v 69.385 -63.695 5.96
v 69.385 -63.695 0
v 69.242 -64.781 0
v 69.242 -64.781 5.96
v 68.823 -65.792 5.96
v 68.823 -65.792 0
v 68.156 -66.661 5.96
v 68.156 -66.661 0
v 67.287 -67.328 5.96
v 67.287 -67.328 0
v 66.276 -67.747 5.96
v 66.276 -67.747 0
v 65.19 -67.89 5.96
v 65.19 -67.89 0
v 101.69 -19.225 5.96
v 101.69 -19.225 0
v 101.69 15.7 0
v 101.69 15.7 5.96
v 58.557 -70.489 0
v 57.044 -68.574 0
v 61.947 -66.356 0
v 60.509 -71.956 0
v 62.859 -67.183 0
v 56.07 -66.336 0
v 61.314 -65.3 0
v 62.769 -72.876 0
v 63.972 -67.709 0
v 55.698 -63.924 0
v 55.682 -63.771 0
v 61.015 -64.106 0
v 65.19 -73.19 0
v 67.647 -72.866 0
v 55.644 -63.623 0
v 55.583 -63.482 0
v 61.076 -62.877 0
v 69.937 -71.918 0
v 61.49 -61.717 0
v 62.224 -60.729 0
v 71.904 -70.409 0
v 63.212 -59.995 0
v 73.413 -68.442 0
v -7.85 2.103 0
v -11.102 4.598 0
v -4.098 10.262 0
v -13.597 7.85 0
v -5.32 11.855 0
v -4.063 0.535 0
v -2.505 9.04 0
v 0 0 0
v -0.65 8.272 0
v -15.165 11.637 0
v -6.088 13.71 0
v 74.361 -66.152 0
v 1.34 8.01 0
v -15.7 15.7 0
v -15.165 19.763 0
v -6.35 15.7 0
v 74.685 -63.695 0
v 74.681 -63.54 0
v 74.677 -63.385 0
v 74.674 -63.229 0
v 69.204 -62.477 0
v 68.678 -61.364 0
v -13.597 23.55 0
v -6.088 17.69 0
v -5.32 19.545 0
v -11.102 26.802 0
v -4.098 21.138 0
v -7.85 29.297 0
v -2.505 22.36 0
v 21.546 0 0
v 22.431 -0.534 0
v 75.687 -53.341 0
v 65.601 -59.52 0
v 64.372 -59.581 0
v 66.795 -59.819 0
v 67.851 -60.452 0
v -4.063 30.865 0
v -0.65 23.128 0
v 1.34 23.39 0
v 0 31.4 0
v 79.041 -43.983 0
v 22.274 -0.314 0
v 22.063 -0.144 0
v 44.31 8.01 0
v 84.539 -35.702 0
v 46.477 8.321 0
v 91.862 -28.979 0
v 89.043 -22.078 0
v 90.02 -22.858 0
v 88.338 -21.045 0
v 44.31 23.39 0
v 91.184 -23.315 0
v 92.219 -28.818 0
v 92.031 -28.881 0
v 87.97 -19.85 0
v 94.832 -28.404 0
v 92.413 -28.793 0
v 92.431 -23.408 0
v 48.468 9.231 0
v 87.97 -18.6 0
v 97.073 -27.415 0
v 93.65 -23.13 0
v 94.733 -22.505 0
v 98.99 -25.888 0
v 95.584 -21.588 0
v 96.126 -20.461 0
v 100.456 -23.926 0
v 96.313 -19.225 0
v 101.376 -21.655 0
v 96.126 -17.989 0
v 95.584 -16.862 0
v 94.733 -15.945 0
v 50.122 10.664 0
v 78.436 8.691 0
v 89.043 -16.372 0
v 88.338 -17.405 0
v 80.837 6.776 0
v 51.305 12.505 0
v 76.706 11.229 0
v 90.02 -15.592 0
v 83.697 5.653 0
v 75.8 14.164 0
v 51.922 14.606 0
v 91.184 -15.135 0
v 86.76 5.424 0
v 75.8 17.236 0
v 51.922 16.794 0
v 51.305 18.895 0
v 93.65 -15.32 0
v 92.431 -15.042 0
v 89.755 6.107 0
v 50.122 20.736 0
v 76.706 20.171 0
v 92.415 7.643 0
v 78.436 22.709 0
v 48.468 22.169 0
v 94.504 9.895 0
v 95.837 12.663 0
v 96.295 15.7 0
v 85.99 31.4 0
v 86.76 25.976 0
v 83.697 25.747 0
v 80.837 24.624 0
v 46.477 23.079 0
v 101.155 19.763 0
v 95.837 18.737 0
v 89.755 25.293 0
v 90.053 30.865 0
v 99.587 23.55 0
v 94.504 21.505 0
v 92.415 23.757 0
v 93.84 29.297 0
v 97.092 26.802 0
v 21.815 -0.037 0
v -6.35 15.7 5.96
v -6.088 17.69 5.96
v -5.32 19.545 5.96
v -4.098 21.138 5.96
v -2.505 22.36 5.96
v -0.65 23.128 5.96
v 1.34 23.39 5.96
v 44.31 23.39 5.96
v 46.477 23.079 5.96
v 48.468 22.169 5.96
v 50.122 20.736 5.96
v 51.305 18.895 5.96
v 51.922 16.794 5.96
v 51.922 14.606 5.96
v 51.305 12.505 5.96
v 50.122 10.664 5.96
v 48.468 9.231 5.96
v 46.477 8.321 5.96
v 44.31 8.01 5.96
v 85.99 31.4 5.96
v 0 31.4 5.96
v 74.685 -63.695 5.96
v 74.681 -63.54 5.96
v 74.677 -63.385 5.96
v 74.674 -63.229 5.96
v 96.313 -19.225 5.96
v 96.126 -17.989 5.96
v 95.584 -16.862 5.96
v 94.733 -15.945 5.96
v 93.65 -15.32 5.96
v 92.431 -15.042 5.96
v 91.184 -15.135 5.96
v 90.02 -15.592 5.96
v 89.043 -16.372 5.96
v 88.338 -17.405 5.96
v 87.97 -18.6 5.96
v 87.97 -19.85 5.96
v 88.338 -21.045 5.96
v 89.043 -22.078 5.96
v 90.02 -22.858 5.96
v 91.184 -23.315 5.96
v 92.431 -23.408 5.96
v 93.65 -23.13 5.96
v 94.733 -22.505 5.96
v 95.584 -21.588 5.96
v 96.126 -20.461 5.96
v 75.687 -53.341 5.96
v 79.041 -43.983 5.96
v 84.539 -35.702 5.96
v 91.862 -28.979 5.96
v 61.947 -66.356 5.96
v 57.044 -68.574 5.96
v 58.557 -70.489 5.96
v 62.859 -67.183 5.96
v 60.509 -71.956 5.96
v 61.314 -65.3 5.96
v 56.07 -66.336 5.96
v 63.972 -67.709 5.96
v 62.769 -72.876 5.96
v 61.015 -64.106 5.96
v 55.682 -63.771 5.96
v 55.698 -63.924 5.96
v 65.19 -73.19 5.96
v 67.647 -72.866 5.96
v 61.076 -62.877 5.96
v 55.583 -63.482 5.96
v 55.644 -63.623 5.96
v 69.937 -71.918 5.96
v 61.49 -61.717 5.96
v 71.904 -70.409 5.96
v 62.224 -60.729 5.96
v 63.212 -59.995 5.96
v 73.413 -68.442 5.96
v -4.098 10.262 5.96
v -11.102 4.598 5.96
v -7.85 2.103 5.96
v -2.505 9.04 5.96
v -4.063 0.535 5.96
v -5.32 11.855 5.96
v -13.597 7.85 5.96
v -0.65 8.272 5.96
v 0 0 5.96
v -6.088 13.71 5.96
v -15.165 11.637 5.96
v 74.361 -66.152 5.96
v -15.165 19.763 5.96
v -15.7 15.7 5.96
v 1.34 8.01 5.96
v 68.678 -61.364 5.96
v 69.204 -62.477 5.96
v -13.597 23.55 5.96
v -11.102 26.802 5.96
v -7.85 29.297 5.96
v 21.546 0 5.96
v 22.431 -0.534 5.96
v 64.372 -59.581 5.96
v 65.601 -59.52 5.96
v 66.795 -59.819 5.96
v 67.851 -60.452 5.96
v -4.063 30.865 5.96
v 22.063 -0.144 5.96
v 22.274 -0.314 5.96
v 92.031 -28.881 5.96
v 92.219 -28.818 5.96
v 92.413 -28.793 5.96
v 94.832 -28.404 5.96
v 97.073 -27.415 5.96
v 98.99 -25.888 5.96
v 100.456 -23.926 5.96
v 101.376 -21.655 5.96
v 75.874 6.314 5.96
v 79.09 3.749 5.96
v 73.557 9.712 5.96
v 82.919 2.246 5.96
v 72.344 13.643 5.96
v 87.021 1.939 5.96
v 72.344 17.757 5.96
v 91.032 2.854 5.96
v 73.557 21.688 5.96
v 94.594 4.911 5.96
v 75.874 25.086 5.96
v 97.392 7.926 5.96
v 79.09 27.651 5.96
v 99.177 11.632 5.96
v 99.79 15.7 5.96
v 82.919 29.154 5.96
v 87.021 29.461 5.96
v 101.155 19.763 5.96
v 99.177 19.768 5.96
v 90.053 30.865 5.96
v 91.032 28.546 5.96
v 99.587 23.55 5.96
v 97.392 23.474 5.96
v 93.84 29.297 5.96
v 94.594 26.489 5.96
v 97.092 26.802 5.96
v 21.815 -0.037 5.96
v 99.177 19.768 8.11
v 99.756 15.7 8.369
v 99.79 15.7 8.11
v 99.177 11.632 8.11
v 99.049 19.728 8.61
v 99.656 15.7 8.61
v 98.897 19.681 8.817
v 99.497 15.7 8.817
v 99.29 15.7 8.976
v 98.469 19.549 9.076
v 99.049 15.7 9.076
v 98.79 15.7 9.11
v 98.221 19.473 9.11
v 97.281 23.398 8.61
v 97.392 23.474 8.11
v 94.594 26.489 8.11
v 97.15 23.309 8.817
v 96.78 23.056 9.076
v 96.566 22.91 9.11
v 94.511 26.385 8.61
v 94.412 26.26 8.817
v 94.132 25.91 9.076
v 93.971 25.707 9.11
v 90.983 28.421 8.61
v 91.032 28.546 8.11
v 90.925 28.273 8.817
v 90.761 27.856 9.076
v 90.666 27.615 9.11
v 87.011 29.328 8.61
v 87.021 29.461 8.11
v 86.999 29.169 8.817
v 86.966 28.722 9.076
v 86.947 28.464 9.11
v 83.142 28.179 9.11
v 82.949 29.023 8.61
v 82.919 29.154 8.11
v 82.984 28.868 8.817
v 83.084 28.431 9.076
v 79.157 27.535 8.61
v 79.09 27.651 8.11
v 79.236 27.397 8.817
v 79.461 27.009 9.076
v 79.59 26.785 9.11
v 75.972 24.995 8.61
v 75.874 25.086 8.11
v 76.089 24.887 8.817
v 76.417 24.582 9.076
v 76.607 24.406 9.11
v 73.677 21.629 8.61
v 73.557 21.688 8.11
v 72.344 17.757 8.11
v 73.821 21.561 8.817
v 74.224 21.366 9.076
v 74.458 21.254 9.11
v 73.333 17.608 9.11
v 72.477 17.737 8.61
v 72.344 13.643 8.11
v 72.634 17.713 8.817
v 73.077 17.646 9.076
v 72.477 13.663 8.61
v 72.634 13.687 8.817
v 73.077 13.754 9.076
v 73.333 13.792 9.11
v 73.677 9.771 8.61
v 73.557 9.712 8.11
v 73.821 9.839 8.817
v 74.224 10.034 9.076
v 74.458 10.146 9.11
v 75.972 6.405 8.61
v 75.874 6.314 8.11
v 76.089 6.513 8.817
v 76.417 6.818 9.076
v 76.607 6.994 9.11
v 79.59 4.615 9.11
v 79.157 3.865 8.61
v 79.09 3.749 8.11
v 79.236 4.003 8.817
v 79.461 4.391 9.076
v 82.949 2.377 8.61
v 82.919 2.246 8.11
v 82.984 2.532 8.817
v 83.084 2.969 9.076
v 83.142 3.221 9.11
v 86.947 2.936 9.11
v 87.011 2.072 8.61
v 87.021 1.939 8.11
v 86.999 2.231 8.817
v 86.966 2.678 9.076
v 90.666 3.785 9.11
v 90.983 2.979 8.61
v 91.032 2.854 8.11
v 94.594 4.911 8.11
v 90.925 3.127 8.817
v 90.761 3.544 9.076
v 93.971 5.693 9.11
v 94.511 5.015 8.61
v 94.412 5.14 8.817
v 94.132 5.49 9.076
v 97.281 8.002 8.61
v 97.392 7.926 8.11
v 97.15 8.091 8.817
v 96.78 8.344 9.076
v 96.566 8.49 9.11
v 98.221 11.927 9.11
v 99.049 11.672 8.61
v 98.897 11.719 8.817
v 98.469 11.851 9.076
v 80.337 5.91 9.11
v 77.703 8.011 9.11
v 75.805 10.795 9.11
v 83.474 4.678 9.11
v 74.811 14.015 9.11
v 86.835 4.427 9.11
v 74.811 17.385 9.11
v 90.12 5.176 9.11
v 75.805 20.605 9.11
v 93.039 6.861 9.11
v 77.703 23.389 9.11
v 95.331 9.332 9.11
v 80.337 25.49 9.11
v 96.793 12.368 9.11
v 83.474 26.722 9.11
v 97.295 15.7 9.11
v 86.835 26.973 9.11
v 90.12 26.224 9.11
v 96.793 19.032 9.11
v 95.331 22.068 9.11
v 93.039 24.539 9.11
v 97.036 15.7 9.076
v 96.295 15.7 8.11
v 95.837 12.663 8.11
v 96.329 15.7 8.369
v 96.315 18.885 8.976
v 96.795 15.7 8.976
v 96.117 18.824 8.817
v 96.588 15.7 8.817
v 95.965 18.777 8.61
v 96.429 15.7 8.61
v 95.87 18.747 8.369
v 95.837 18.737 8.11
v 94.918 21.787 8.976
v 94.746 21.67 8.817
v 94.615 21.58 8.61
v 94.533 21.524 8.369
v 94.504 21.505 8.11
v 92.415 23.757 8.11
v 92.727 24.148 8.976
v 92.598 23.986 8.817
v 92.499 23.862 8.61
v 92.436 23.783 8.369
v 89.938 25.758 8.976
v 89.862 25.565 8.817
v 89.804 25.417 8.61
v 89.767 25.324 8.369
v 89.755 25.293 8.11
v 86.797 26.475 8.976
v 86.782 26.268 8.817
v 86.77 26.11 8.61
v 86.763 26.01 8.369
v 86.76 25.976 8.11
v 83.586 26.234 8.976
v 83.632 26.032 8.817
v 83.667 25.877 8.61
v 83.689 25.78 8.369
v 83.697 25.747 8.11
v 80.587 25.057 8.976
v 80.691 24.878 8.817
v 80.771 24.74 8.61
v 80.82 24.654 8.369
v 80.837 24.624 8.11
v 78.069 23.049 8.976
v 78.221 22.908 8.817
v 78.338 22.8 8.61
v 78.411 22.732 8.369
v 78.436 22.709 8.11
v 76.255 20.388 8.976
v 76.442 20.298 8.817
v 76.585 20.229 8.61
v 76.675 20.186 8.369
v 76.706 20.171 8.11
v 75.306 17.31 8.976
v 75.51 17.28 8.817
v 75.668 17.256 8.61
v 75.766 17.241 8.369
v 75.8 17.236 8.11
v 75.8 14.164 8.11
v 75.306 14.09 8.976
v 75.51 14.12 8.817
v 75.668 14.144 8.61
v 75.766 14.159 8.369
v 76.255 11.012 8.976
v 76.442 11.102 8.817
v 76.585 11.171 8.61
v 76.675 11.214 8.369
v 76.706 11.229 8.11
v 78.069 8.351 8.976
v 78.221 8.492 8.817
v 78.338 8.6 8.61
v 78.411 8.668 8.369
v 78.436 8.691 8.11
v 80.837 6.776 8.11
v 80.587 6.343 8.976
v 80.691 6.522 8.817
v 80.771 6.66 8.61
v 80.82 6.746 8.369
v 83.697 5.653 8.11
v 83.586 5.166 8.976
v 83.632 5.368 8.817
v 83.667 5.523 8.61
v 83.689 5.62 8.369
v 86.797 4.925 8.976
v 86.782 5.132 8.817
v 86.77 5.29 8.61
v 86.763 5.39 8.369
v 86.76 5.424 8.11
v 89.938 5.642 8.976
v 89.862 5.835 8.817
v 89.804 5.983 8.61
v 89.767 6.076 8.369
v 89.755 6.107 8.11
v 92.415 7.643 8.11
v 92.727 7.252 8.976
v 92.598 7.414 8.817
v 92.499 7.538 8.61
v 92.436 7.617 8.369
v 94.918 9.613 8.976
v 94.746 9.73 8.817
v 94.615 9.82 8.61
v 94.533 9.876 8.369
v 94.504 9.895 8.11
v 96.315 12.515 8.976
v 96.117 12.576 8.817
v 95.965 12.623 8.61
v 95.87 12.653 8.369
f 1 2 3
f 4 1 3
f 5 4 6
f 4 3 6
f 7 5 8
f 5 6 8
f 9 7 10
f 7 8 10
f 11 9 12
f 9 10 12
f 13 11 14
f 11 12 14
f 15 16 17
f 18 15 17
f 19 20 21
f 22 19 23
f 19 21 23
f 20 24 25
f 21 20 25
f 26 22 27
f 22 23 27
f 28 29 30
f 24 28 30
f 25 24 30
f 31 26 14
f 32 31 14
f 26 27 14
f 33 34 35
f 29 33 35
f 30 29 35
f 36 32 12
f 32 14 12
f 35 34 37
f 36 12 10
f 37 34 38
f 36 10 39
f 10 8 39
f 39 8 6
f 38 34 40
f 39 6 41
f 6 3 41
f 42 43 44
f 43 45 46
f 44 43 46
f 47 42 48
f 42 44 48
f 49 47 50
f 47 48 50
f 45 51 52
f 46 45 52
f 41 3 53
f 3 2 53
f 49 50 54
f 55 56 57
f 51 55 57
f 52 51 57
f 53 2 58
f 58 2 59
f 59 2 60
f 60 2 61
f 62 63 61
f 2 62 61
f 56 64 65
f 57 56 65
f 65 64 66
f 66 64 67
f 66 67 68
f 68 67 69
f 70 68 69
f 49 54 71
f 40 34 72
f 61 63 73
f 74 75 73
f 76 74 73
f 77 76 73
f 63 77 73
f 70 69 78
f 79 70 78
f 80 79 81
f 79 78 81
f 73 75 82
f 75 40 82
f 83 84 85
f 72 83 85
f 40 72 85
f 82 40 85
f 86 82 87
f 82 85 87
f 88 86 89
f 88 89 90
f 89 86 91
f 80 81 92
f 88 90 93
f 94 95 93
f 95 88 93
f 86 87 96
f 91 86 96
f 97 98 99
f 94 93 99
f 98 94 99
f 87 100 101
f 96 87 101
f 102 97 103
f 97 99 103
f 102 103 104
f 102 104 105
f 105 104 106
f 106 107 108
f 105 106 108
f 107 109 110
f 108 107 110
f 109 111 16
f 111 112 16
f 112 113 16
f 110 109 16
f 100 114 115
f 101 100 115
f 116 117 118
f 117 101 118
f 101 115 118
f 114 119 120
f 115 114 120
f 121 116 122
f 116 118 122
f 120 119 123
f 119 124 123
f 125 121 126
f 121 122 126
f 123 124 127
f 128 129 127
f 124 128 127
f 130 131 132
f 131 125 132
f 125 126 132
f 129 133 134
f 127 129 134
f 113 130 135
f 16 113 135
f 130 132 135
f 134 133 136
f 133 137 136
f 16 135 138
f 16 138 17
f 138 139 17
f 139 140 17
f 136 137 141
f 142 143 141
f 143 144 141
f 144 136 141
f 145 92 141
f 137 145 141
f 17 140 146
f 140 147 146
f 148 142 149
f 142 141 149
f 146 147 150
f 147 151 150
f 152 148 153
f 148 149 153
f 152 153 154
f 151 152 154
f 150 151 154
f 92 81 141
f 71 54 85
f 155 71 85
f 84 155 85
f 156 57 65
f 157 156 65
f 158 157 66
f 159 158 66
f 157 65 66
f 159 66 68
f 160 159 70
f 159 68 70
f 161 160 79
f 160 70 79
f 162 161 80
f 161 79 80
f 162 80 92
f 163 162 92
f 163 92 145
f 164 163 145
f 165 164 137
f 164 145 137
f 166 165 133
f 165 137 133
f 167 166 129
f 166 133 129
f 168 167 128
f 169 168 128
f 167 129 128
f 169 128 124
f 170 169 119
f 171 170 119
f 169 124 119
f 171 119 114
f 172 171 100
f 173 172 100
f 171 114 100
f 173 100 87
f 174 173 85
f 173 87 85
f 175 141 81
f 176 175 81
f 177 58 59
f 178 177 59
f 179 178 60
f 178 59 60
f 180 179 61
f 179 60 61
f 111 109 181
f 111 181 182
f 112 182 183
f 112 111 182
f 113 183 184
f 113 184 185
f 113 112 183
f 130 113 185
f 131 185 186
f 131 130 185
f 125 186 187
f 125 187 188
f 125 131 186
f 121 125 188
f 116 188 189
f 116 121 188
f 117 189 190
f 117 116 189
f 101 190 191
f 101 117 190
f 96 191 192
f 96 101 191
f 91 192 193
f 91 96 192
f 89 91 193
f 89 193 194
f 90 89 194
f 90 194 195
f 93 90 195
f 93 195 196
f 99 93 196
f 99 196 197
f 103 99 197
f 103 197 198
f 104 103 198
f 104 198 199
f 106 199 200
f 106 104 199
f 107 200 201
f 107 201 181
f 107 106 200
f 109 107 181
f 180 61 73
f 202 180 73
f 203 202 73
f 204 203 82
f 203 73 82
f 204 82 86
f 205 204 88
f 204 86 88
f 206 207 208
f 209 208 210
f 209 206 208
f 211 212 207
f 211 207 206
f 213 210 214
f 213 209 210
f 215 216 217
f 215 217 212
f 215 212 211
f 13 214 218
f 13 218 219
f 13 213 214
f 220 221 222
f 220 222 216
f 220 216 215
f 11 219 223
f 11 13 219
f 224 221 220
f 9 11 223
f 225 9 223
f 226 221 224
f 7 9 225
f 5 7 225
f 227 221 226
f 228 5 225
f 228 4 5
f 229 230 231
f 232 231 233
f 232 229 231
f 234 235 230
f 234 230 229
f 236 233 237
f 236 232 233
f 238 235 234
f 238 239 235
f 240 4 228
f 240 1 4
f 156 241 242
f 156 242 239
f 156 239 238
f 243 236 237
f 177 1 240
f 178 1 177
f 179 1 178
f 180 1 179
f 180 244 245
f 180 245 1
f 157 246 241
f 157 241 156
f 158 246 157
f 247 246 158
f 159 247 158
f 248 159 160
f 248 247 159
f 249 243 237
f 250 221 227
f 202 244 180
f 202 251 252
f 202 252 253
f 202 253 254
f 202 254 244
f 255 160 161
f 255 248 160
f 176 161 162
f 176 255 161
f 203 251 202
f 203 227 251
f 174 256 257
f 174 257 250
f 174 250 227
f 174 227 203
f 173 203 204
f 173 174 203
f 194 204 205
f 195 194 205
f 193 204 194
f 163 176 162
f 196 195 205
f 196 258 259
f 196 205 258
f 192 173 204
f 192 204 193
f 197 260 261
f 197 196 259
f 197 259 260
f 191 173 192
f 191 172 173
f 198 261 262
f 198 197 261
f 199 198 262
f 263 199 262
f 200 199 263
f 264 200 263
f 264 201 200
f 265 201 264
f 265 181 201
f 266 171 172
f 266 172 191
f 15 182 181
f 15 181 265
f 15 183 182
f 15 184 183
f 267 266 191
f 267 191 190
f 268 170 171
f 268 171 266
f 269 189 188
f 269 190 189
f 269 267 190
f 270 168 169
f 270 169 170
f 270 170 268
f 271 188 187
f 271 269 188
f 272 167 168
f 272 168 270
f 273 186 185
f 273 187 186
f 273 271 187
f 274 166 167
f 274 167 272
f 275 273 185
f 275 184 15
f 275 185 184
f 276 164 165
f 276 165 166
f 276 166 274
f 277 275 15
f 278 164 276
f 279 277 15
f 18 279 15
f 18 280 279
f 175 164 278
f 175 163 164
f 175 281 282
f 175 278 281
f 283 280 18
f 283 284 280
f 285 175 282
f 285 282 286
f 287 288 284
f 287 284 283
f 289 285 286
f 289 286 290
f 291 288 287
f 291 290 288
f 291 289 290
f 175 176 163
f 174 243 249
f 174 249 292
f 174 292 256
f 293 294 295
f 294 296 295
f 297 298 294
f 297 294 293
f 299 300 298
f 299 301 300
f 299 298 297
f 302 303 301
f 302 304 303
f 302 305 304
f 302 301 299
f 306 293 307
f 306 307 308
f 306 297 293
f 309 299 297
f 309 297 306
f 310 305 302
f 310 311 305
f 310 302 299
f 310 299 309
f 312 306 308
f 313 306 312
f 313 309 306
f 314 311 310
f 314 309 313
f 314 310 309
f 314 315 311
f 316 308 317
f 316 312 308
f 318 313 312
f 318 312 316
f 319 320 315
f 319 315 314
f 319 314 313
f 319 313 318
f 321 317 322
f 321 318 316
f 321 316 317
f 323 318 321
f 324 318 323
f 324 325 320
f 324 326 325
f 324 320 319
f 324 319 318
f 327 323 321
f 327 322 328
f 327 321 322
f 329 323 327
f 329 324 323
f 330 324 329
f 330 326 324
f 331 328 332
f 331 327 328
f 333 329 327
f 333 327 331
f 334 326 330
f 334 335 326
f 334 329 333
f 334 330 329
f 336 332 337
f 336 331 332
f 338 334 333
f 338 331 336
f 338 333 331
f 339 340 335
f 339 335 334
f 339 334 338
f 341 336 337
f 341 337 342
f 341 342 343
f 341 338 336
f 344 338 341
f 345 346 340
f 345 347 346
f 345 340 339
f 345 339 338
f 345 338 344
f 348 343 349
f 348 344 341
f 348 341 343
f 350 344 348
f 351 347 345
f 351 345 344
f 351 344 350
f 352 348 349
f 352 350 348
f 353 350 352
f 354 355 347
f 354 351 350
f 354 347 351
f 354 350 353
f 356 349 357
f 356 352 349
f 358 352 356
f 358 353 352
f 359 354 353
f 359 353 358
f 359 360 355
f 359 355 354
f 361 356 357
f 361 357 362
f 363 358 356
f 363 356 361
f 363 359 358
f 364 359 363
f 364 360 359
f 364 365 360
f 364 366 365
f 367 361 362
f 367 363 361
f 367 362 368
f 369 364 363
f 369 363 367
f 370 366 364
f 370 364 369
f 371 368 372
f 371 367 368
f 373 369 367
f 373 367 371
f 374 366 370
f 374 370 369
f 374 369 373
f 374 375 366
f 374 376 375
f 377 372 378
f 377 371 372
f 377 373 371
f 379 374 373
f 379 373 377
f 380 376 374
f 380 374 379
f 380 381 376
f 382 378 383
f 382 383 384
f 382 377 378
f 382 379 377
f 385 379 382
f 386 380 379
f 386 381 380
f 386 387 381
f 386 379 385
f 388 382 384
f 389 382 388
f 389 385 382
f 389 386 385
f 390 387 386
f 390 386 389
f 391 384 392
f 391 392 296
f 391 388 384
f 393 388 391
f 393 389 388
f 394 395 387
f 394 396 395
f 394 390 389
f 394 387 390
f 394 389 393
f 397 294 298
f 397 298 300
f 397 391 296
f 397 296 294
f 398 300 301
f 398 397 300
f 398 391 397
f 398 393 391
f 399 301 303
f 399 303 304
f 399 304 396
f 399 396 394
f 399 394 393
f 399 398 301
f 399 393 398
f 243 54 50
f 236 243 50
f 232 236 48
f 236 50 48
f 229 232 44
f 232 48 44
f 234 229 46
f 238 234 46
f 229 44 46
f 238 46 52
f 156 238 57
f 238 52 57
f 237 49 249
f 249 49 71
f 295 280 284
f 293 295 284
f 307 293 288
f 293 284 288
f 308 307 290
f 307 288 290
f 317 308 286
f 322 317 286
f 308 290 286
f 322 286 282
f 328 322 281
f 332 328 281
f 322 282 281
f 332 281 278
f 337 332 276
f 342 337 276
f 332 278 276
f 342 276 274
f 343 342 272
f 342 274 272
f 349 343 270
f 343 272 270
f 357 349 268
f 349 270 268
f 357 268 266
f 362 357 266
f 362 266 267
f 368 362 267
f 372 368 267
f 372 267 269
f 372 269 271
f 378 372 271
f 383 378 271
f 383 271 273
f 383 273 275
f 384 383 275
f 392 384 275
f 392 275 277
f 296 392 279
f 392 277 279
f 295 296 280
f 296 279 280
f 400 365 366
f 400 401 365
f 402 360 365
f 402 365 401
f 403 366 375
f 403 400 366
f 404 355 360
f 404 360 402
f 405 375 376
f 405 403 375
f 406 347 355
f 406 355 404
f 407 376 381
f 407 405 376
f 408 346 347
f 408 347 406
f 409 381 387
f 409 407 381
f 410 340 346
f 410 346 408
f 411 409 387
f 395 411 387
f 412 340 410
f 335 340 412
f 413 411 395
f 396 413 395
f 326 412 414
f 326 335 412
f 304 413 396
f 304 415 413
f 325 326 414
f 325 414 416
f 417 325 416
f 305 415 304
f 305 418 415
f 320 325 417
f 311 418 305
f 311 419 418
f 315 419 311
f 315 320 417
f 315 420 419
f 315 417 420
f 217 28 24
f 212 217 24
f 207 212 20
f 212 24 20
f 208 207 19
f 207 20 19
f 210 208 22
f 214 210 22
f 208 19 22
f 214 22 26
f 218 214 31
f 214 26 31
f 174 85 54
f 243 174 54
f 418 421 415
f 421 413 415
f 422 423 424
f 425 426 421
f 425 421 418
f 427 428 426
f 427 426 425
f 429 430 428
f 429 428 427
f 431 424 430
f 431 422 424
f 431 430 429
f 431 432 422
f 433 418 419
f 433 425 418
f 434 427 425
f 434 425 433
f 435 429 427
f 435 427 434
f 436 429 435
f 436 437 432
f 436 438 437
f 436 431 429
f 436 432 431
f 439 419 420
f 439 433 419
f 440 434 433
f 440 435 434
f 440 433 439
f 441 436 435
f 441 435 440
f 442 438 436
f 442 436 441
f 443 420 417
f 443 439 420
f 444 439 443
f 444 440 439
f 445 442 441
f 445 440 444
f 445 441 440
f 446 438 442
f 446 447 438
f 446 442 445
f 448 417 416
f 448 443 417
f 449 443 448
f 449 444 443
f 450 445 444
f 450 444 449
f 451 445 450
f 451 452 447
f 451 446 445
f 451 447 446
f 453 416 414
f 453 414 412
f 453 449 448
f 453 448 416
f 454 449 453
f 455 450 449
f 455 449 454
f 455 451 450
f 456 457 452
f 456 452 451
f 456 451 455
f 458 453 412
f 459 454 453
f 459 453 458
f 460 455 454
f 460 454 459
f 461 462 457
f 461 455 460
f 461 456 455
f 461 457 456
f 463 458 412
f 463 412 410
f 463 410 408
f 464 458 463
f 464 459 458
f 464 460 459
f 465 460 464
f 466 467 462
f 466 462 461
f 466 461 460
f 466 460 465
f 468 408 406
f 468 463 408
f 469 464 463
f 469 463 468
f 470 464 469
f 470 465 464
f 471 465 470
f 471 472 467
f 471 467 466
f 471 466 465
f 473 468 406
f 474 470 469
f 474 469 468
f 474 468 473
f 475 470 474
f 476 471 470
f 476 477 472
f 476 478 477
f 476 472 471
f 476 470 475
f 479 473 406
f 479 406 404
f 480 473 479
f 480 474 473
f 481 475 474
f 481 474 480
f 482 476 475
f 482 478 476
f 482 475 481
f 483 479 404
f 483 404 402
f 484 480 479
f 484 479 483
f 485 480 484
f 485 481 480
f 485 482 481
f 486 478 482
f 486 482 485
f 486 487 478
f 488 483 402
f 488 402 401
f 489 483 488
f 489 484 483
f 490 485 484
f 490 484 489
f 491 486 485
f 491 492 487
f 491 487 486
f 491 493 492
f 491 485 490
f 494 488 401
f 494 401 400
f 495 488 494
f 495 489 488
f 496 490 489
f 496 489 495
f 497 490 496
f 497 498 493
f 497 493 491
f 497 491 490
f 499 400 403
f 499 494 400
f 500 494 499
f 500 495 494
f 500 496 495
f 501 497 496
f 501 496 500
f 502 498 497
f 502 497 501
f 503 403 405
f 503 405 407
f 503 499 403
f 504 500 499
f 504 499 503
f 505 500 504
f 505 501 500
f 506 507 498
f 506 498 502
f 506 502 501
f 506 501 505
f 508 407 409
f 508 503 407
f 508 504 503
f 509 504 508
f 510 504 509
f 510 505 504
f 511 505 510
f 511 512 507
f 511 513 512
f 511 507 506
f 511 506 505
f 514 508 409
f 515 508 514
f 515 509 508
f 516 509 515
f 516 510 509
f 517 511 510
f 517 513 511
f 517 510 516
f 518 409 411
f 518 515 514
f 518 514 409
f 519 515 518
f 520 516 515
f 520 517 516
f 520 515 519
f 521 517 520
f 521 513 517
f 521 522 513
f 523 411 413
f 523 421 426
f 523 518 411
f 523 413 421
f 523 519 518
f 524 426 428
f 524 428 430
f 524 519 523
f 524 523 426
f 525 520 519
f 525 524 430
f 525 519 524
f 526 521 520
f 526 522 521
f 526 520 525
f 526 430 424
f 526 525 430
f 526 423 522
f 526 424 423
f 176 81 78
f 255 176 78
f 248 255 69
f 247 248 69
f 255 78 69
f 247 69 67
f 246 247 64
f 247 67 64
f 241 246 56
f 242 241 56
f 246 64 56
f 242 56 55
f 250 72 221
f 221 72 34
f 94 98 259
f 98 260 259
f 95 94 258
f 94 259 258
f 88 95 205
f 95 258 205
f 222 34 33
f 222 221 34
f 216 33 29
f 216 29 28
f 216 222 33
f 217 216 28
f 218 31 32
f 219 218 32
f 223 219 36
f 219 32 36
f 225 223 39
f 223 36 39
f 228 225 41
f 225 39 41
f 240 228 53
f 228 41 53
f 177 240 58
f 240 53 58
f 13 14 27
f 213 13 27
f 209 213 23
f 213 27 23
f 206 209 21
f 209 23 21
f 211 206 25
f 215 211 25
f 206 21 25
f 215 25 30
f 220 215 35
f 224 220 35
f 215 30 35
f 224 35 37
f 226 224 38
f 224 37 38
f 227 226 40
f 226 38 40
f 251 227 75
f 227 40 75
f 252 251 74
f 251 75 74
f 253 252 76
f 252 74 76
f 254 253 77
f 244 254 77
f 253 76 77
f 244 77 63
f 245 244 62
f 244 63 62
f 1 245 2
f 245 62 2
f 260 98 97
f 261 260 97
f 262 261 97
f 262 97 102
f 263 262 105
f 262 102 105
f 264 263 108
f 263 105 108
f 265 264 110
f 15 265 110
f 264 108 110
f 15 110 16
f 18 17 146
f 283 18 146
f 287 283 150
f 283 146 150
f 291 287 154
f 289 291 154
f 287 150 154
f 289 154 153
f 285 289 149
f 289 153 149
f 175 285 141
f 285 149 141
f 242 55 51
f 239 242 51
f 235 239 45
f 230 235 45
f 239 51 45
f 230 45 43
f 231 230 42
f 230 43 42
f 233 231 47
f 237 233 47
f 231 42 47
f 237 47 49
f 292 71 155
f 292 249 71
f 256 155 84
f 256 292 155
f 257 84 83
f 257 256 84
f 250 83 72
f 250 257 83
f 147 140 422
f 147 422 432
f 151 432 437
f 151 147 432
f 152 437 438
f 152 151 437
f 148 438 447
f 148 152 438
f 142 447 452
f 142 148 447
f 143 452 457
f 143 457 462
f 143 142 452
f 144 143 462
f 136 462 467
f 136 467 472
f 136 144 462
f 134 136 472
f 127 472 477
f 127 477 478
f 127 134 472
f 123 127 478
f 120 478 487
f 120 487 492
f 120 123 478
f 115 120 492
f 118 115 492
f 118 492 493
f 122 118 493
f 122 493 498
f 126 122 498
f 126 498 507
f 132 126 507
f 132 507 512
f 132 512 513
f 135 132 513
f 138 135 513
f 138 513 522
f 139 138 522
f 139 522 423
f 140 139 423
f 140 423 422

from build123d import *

# Parameters (mm, degrees)
SKETCH2_R           = 4.195
SKETCH2_R_2         = 10.305
BOSS_EXTRUDE1_DEPTH = 5.96
FILLET1_R           = 1
SKETCH3_R           = 13.8
SKETCH3_R_2         = 10.305
BOSS_EXTRUDE2_DEPTH = 3.15
FILLET2_R           = 1


with BuildPart() as part:
    # Sketch2 → Boss-Extrude1 (new body)
    with BuildSketch(Plane.XY):
        with BuildLine():
            Line((101.69, 0), (101.69, 15.7))
            ThreePointArc((101.69, 15.7), (97.091576465, 26.801576465), (85.99, 31.4))
            Line((85.99, 31.4), (0, 31.4))
            ThreePointArc((0, 31.4), (-11.101576465, 26.801576465), (-15.7, 15.7))
            ThreePointArc((-15.7, 15.7), (-11.101576465, 4.598423535), (0, 0))
            Line((0, 0), (22.15, 0))
            Line((22.15, 0), (55.695, -63.695))
            ThreePointArc((55.695, -63.695), (58.476021113, -70.408978887), (65.19, -73.19))
            ThreePointArc((65.19, -73.19), (71.903978887, -70.408978887), (74.685, -63.695))
            ThreePointArc((74.685, -63.695), (74.678632674, -63.462256539), (74.673581437, -63.229480796))
            ThreePointArc((74.673581437, -63.229480796), (79.11133413, -43.842864153), (92.1177, -28.7973))
            ThreePointArc((92.1177, -28.7973), (98.886338242, -25.993638242), (101.69, -19.225))
            Line((101.69, -19.225), (101.69, -12.489796776))
            Line((101.69, -12.489796776), (101.69, 0))
        make_face()
        with BuildLine():
            ThreePointArc((69.385, -63.695), (68.156312947, -66.661312947), (65.19, -67.89))
            ThreePointArc((65.19, -67.89), (62.223687053, -60.728687053), (69.385, -63.695))
        make_face(mode=Mode.SUBTRACT)
        with BuildLine():
            ThreePointArc((1.34, 8.01), (-4.097651147, 10.262348853), (-6.35, 15.7))
            ThreePointArc((-6.35, 15.7), (-4.097651147, 21.137651147), (1.34, 23.39))
            Line((1.34, 23.39), (44.31, 23.39))
            ThreePointArc((44.31, 23.39), (52, 15.7), (44.31, 8.01))
            Line((44.31, 8.01), (1.34, 8.01))
        make_face(mode=Mode.SUBTRACT)
        with Locations((92.1177, -19.225)):
            Circle(SKETCH2_R, mode=Mode.SUBTRACT)
        with Locations((85.99, 15.7)):
            Circle(SKETCH2_R_2, mode=Mode.SUBTRACT)
    extrude(amount=BOSS_EXTRUDE1_DEPTH)

    # Fillet1
    fillet1_edges = [part.edges().sort_by_distance(p)[0] for p in [
        (92.1177, -28.7973, 2.98),
        (55.695, -63.695, 2.98),
        (22.15, 0, 2.98),
    ]]
    fillet(fillet1_edges, radius=FILLET1_R)

    # Sketch3 → Boss-Extrude2 (add)
    with BuildSketch(Plane.XY.offset(5.96)):
        with Locations((85.99, 15.7)):
            Circle(SKETCH3_R)
        with Locations((85.99, 15.7)):
            Circle(SKETCH3_R_2, mode=Mode.SUBTRACT)
    extrude(amount=BOSS_EXTRUDE2_DEPTH)

    # Fillet2
    fillet2_edges = [part.edges().sort_by_distance(p)[0] for p in [
        (72.19, 15.7, 9.11),
        (75.685, 15.7, 9.11),
    ]]
    fillet(fillet2_edges, radius=FILLET2_R)


solid = part.part
